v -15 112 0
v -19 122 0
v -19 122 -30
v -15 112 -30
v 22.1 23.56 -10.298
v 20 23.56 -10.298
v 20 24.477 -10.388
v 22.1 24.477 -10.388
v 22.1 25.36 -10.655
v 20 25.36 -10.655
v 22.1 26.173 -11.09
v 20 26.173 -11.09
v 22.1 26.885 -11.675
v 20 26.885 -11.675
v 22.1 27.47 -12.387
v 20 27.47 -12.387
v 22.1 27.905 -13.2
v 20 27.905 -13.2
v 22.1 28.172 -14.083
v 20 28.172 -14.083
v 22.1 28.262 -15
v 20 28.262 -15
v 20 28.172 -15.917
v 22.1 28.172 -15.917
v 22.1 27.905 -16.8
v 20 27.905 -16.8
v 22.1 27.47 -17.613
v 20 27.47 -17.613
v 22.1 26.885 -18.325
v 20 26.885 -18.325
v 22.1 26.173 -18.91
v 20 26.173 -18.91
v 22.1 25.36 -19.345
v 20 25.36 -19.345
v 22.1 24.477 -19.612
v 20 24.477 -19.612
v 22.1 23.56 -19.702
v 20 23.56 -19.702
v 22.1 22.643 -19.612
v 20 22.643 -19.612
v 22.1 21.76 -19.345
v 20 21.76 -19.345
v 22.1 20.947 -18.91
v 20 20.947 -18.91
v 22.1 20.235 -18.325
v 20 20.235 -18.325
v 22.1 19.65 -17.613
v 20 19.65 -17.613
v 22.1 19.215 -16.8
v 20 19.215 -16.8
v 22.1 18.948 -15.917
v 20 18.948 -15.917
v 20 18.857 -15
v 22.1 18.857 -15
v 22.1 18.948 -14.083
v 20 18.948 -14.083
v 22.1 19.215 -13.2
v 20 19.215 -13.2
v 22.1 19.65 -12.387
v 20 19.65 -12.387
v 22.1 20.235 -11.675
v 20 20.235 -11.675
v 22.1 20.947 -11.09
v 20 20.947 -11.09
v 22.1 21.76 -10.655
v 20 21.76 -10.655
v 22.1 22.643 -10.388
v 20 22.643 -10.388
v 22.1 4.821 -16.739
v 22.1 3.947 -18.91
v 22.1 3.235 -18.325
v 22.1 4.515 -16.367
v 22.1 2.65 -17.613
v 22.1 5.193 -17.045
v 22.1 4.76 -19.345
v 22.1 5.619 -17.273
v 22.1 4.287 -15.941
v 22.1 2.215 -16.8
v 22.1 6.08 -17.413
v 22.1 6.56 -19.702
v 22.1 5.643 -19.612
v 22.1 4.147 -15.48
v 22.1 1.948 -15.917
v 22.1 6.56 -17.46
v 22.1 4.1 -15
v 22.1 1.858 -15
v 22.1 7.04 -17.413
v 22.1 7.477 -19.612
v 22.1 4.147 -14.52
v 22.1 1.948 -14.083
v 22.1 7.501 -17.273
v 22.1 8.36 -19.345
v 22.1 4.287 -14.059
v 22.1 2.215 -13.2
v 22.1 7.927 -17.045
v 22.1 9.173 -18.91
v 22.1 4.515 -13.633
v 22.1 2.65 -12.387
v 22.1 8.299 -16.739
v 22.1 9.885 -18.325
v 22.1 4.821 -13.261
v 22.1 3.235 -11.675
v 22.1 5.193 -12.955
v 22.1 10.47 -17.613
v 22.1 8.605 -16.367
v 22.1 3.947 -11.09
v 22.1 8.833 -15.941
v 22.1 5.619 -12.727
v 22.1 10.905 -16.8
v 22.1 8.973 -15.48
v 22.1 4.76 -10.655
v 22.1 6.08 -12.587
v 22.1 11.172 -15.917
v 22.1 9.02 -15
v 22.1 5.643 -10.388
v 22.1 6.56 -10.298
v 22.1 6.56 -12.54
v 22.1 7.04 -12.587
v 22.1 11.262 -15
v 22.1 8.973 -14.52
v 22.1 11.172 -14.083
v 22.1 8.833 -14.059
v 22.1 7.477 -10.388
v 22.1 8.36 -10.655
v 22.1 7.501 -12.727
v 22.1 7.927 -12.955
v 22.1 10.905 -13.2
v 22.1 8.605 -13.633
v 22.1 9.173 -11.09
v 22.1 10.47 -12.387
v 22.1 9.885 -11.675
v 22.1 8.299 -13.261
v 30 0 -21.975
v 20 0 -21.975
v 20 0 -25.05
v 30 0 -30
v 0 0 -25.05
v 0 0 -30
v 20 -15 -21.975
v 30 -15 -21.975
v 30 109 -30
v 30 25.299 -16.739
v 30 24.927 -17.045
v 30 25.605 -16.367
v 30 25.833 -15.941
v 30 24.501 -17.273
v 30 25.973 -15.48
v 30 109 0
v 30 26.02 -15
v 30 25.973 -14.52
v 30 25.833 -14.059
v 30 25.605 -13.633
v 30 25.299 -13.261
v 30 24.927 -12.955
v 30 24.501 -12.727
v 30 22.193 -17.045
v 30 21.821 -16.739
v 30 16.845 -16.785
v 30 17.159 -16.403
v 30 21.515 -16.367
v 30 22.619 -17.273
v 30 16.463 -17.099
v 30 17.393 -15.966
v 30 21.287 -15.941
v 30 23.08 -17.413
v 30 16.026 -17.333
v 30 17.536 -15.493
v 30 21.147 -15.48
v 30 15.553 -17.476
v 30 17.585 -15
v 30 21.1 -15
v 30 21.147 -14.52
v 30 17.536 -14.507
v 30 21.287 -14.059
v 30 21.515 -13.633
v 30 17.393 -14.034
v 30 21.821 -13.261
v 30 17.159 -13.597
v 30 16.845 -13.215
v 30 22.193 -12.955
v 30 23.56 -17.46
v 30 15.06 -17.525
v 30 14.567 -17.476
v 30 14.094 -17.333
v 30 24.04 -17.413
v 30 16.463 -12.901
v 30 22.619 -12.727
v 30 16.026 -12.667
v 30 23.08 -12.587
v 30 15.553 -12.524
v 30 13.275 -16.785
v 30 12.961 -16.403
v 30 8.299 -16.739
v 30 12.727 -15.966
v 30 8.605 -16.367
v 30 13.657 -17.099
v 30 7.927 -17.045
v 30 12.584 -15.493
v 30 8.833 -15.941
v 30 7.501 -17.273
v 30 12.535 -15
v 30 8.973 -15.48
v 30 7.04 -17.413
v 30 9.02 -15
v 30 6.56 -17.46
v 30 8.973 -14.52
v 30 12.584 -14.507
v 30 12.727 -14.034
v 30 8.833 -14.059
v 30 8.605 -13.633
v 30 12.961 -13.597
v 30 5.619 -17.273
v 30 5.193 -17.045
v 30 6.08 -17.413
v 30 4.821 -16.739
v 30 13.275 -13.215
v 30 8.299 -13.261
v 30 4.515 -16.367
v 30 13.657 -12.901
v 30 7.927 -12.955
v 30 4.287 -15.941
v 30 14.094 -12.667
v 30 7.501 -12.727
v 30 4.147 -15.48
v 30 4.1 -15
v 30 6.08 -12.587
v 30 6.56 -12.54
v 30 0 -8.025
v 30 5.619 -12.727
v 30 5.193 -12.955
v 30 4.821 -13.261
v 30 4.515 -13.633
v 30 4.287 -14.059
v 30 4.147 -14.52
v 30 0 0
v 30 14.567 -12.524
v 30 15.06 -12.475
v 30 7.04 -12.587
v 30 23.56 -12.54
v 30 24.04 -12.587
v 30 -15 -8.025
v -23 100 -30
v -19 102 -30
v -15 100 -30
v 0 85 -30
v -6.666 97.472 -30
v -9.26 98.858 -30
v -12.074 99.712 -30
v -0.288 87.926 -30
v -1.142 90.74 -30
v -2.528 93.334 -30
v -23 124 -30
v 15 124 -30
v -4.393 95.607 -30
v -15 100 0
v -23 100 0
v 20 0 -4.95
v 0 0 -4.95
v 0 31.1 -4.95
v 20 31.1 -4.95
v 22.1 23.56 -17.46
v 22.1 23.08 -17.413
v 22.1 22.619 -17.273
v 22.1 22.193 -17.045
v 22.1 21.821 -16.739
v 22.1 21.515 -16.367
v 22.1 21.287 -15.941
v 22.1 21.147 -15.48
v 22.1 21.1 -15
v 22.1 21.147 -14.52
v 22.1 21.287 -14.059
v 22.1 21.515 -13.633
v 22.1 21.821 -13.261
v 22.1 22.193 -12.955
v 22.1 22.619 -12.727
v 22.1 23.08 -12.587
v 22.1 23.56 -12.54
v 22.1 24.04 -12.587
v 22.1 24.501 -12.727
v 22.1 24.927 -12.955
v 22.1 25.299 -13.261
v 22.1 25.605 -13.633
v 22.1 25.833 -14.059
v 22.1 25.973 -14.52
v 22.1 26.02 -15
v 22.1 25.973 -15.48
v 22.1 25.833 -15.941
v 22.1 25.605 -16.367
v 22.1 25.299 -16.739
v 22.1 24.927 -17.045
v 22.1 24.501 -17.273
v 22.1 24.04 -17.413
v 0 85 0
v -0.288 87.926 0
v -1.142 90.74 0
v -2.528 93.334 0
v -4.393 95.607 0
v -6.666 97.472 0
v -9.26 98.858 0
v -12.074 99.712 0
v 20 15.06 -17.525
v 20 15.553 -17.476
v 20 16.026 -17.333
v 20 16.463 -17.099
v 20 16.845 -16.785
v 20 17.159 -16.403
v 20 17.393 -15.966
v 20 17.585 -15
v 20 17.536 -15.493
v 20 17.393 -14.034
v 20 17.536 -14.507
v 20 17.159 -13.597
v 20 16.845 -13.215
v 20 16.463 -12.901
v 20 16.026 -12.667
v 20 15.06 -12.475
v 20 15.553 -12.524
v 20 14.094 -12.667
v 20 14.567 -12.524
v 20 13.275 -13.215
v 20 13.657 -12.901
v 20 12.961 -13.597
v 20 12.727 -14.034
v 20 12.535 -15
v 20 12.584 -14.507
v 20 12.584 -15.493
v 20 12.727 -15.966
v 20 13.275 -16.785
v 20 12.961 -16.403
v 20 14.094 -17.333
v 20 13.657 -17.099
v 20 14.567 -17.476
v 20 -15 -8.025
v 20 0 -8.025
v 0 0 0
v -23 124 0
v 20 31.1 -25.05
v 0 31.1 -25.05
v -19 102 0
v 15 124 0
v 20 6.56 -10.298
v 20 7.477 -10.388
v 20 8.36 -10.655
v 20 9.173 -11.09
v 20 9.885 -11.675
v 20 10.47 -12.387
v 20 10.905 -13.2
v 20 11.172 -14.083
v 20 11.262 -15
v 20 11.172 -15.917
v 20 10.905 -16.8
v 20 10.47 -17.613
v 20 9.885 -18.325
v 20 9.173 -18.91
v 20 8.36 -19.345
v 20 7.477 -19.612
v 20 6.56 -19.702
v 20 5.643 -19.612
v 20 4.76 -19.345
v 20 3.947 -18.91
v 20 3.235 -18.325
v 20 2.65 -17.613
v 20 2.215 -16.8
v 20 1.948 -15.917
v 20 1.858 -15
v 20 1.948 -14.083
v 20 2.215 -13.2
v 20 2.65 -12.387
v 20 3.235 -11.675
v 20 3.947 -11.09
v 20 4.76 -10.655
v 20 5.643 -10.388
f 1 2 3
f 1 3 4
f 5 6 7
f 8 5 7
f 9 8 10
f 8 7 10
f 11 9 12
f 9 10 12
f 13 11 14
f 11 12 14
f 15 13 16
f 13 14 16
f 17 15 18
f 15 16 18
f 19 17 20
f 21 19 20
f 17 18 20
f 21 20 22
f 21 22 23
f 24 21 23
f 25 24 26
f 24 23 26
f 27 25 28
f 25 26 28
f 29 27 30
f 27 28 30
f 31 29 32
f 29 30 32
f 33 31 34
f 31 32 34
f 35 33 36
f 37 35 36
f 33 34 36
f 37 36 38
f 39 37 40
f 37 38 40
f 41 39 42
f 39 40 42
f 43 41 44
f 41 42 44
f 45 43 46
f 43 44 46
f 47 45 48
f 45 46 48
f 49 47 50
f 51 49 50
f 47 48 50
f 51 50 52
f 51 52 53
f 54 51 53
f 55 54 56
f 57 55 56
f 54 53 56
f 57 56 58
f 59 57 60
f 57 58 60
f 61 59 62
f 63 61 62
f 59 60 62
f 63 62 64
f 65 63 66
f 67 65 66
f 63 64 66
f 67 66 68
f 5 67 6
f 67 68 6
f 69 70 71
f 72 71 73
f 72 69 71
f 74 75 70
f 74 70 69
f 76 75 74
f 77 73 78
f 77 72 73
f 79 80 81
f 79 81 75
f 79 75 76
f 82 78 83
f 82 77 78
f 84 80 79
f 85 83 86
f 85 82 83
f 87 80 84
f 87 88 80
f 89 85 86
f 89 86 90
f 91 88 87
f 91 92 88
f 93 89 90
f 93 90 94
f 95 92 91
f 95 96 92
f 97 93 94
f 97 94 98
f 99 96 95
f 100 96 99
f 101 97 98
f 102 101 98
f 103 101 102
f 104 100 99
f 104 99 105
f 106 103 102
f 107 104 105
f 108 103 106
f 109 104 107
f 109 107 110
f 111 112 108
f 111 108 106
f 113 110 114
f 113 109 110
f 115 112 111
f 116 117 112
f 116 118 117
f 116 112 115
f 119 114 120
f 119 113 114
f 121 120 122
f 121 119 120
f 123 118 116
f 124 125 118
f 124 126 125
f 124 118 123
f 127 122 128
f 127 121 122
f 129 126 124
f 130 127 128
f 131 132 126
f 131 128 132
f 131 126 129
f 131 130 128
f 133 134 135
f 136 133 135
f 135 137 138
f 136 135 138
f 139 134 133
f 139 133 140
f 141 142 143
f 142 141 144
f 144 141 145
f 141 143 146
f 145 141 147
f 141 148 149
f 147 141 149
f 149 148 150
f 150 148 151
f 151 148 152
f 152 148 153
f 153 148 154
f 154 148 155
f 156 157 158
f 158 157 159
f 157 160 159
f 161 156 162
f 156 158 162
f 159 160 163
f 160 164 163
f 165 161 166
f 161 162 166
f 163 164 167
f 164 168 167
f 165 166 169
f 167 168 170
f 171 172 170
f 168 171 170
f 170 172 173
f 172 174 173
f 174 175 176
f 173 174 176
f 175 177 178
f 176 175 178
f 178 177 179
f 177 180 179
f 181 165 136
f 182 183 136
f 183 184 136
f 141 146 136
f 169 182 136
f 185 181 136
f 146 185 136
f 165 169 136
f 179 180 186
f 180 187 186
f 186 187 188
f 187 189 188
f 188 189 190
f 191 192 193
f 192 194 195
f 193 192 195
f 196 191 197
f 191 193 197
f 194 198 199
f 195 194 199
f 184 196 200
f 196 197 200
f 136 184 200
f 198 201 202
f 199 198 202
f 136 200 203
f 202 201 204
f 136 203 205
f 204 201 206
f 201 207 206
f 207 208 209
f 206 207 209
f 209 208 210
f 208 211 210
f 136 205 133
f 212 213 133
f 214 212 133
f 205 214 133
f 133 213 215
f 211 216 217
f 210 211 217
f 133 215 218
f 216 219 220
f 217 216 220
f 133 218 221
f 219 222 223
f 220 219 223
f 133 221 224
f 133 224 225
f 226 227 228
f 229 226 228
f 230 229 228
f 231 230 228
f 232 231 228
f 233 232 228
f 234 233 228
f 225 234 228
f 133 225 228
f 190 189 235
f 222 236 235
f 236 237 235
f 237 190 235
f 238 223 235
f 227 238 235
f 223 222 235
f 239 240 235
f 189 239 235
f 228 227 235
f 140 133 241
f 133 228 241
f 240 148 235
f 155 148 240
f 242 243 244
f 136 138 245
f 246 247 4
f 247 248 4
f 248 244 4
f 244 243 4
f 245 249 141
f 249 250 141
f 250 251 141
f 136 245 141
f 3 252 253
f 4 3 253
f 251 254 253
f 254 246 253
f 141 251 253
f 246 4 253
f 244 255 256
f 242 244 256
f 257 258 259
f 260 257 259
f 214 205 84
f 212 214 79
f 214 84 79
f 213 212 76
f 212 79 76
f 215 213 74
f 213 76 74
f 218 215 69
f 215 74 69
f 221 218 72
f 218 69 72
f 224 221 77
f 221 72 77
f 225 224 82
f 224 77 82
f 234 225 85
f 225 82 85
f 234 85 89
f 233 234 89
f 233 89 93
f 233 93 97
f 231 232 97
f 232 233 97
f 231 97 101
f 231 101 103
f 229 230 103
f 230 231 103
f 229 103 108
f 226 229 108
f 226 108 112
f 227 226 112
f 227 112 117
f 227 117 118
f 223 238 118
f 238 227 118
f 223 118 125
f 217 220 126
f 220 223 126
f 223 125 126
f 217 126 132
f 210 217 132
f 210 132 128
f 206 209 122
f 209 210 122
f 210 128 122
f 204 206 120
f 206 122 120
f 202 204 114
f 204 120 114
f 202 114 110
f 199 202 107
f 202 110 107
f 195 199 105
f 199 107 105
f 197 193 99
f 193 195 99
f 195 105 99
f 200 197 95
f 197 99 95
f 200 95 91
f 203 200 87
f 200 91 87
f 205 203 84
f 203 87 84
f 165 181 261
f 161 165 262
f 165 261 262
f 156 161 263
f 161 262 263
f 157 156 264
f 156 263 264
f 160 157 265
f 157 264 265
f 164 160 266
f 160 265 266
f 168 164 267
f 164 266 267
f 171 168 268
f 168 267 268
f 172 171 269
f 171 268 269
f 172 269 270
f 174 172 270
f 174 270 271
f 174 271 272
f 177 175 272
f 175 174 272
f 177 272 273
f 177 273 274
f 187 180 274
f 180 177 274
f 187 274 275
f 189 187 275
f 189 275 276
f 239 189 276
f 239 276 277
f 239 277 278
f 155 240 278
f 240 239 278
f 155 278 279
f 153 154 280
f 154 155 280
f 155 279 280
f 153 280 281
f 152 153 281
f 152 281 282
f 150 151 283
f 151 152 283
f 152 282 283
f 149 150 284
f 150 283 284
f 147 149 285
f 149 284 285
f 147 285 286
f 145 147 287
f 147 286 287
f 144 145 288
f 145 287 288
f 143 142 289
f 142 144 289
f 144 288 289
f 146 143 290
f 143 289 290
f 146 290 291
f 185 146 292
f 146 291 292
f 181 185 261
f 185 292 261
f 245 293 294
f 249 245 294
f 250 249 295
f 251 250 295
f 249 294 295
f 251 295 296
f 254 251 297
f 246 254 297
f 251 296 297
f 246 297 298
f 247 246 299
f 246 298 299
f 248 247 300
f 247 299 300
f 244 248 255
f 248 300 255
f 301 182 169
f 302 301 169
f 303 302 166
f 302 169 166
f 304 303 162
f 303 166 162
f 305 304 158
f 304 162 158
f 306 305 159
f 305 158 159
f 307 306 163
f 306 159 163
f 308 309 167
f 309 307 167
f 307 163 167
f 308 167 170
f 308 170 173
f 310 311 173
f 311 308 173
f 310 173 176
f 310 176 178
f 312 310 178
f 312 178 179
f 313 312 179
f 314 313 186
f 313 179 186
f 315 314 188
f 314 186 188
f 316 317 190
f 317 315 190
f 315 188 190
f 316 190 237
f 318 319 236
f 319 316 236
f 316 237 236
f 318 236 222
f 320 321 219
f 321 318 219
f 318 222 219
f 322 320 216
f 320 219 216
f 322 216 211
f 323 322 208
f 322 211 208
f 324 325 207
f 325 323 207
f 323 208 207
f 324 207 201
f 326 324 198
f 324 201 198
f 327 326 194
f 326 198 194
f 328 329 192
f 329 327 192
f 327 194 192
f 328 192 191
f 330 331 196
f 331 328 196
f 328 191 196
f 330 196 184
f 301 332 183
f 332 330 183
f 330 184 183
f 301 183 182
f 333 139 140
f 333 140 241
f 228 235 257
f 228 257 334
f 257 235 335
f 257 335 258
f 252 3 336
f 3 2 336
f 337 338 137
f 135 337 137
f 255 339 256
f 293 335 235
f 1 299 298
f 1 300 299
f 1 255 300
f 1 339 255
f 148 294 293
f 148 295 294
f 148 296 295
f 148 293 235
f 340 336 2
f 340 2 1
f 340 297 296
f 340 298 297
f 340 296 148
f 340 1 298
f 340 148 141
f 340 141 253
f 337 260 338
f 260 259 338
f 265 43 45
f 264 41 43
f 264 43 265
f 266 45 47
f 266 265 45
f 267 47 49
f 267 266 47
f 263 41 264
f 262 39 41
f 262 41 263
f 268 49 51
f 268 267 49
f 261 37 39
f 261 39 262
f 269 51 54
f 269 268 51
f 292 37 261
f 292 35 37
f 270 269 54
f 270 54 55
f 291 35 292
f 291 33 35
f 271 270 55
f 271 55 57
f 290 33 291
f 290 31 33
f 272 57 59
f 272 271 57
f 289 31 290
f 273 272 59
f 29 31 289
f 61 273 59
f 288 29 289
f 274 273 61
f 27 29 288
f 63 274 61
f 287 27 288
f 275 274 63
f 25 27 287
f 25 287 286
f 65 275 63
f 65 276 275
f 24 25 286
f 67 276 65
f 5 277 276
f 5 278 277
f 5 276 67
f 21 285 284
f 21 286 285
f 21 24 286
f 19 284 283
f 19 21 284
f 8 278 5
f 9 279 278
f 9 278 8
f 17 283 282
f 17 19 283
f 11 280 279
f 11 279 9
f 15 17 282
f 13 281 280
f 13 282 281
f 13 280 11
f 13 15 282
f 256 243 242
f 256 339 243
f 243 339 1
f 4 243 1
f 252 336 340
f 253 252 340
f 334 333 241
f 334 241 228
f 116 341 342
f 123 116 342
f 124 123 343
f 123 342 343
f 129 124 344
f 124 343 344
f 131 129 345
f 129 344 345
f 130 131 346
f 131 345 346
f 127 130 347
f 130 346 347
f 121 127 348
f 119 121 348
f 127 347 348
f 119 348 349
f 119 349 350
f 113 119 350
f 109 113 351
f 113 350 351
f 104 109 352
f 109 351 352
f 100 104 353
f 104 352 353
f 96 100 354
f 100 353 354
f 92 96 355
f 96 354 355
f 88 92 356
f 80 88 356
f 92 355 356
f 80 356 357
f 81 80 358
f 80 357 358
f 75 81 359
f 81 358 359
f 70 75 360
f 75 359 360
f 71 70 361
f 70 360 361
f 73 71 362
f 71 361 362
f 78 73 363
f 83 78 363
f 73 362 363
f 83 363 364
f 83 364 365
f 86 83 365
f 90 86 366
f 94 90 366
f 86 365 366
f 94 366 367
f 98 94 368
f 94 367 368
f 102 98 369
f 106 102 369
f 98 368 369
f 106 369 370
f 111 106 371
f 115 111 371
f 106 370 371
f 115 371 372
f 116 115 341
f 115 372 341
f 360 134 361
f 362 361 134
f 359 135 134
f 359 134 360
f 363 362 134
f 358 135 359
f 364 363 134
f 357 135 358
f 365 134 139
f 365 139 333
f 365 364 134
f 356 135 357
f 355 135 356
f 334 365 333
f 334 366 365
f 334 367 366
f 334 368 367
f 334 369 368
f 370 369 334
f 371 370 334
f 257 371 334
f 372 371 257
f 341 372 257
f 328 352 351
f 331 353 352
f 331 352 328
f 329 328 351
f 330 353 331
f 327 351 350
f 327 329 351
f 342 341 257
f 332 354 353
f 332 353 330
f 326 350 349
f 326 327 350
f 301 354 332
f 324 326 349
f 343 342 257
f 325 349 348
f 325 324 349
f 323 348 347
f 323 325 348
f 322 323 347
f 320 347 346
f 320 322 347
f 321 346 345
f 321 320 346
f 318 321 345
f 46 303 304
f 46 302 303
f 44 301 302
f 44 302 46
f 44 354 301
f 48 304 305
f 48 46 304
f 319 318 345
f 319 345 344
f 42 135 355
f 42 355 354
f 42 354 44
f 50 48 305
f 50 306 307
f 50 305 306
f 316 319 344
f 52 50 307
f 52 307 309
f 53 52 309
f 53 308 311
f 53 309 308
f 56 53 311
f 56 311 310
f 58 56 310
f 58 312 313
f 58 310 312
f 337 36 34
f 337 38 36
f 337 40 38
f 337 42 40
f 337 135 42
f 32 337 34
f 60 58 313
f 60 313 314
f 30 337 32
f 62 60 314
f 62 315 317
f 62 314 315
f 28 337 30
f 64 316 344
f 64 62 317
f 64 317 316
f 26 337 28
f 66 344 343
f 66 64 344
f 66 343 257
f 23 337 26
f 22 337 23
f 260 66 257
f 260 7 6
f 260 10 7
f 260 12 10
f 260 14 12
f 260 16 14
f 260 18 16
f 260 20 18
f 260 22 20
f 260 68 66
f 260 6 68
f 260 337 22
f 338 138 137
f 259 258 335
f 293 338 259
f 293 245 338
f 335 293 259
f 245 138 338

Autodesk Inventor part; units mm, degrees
ref_plane "YZ Plane" through (0, 0, 0) normal (1, 0, 0) x (0, 1, 0)
ref_plane "XZ Plane" through (0, 0, 0) normal (0, 1, 0) x (-1, 0, 0)
ref_plane "XY Plane" through (0, 0, 0) normal (0, 0, 1) x (1, 0, 0)
sketch "Sketch1" plane through (0, 0, 0) normal (0, 0, 1) x (1, 0, 0)
  line L0 (0, 0) -> (25, 0)
  line L1 (25, 0) -> (25, 40)
  line L2 (25, 40) -> (0, 40)
  line L3 (0, 40) -> (0, 0)
  dimension "d1" = 25
  dimension "d2" = 40
  dimension "d3" = 25
extrude "Extrusion1" add sketch "Sketch1" against normal blind 30
sketch "Sketch2" plane through (25, 0, 0) normal (1, 0, 0) x (0, 0, -1)
  line L0 (0, 0) -> (30, 0) projected
  circle A0 centre (15, 6.56) radius 2.46
extrude "Extrusion2" cut sketch "Sketch2" against normal blind 30
sketch "Sketch3" plane through (0, 0, 0) normal (-1, 0, 0) x (0, 0, 1)
  line L0 (0, 0) -> (-30, 0) projected
  line L1 (-25.05, 0) -> (-4.95, 0)
  line L2 (-4.95, 0) -> (-4.95, 33.12)
  line L3 (-4.95, 33.12) -> (-25.05, 33.12)
  line L4 (-25.05, 33.12) -> (-25.05, 0)
  dimension "d11" = 20.1
extrude "Extrusion3" cut sketch "Sketch3" against normal blind 20
sketch "Sketch4" plane through (0, 0, 0) normal (0, -1, 0) x (1, 0, 0)
  line L0 (20, -4.95) -> (20, -25.05) projected
  line L1 (20, -15) -> (25, -15)
  line L2 (25, 0) -> (25, -30) projected
  line L3 (20, -8.025) -> (25, -8.025)
  line L4 (25, -8.025) -> (25, -21.975)
  line L5 (25, -21.975) -> (20, -21.975)
  line L6 (20, -21.975) -> (20, -8.025)
  line L7 (20, -8.025) -> (25, -21.975) construction
  line L8 (25, -8.025) -> (20, -21.975) construction
  line L9 (25, -12.54) -> (25, -17.46) projected
  point P0 (0, 0)
  point P1 (22.5, -15)
  dimension "d14" = 13.95
extrude "Extrusion4" add sketch "Sketch4" along normal blind 15
sketch "Sketch5" plane through (20, 0, 0) normal (-1, 0, 0) x (0, 0, 1)
  circle A0 centre (-15, 6.56) radius 2.46 projected
  circle A1 centre (-15, 6.56) radius 4.7025
  circle A2 centre (-15, 6.56) radius 2.46 projected
  circle A3 centre (-15, 6.56) radius 2.46
  point P0 (0, 0)
  dimension "d17" = 9.405
extrude "Extrusion5" cut sketch "Sketch5" against normal blind 2.1
sketch "Sketch6" plane through (25, 0, 0) normal (1, 0, 0) x (0, 0, -1)
  circle A0 centre (15, 6.56) radius 4.7025 projected
  line L0 (15, 6.56) -> (15, 23.56)
  circle A1 centre (15, 23.56) radius 2.46
  point P0 (0, 0)
  dimension "d20" = 17
  dimension "d21" = 4.92
extrude "Extrusion6" cut sketch "Sketch6" against normal blind 10 contours A1
sketch "Sketch7" plane through (20, 0, 0) normal (-1, 0, 0) x (0, 0, 1)
  circle A0 centre (-15, 23.56) radius 2.46 projected
  circle A1 centre (-15, 23.56) radius 4.7025
  point P0 (0, 0)
  dimension "d24" = 9.405
extrude "Extrusion7" cut sketch "Sketch7" against normal blind 2.1
sketch "Sketch9" plane through (25, 0, 0) normal (1, 0, 0) x (0, 0, -1)
  circle A0 centre (15, 6.56) radius 2.46 projected
  circle A1 centre (15, 6.56) radius 2.46
  circle A2 centre (15, 23.56) radius 2.46 projected
  circle A3 centre (15, 23.56) radius 2.46
  line L0 (30, 40) -> (30, 0) projected
  line L1 (30, 0) -> (30, 40)
  line L2 (30, 40) -> (0, 40)
  line L3 (0, 40) -> (0, 0)
  line L4 (0, 0) -> (8.025, 0) projected
  line L5 (21.975, 0) -> (21.975, -15)
  line L6 (21.975, -15) -> (8.025, -15)
  line L7 (8.025, -15) -> (8.025, 0)
  line L8 (0, 0) -> (8.025, 0)
  line L9 (21.975, 0) -> (30, 0)
extrude "Extrusion8" add sketch "Sketch9" along normal blind 5
sketch "Sketch10" plane through (0, 40, 0) normal (0, 1, 0) x (1, 0, 0)
  line L0 (0, 30) -> (30, 30) projected
  line L1 (30, 0) -> (0, 0) projected
  line L2 (0, 30) -> (30, 30)
  line L3 (30, 30) -> (30, 0)
  line L4 (30, 0) -> (0, 0)
  line L5 (0, 0) -> (0, 30)
extrude "Extrusion9" add sketch "Sketch10" along normal blind 30
sketch "Sketch12" plane through (30, 0, 0) normal (1, 0, 0) x (0, 0, -1)
  circle A0 centre (15, 6.56) radius 2.46 projected
  line L0 (15, 6.56) -> (15, 15.06)
  circle A1 centre (15, 15.06) radius 2.525
  point P0 (0, 0)
  dimension "d31" = 8.5
  dimension "d33" = 5.05
extrude "Extrusion10" cut sketch "Sketch12" against normal blind 30 contours A1
sketch "Sketch14" plane through (0, 0, 0) normal (0, 0, 1) x (1, 0, 0)
  line L0 (30, 70) -> (0, 70) projected
  line L1 (0, 70) -> (0, 85)
  line L2 (-15, 100) -> (-23, 100)
  line L3 (30, 0) -> (30, 70) projected
  line L4 (30, 109) -> (30, 70)
  arc A0 (0, 85) -> (-15, 100) centre (-15, 85) ccw
  line L5 (30, 105) -> (30, 100)
  line L6 (-23, 124) -> (15, 124)
  line L7 (-19, 122) -> (-23, 124)
  line L8 (-19, 122) -> (-15, 112)
  line L9 (-19, 102) -> (-23, 100)
  line L10 (-19, 102) -> (-15, 112)
  line L11 (30, 109) -> (15, 124)
  point P0 (0, 0)
  point P1 (0, 100)
  dimension "d47" = 30
  dimension "d54" = 15
extrude "Extrusion12" add sketch "Sketch14" against normal blind 30
sketch "Sketch15" plane through (0, 0, -25.05) normal (-1, 0, 0) x (0, 0, 1)
  line L0 (0, 33.12) -> (20.1, 33.12) projected
  line L1 (20.1, 33.12) -> (20.1, 0) projected
  line L2 (0, 33.12) -> (20.1, 33.12)
  line L3 (20.1, 33.12) -> (20.1, 31.1)
  line L4 (20.1, 31.1) -> (0, 31.1)
  line L5 (0, 31.1) -> (0, 33.12)
  point P0 (25.05, 0)
  dimension "d57" = 2.02
extrude "Extrusion13" add sketch "Sketch15" against normal blind 20
properties part number "20mm_x_30mm"
